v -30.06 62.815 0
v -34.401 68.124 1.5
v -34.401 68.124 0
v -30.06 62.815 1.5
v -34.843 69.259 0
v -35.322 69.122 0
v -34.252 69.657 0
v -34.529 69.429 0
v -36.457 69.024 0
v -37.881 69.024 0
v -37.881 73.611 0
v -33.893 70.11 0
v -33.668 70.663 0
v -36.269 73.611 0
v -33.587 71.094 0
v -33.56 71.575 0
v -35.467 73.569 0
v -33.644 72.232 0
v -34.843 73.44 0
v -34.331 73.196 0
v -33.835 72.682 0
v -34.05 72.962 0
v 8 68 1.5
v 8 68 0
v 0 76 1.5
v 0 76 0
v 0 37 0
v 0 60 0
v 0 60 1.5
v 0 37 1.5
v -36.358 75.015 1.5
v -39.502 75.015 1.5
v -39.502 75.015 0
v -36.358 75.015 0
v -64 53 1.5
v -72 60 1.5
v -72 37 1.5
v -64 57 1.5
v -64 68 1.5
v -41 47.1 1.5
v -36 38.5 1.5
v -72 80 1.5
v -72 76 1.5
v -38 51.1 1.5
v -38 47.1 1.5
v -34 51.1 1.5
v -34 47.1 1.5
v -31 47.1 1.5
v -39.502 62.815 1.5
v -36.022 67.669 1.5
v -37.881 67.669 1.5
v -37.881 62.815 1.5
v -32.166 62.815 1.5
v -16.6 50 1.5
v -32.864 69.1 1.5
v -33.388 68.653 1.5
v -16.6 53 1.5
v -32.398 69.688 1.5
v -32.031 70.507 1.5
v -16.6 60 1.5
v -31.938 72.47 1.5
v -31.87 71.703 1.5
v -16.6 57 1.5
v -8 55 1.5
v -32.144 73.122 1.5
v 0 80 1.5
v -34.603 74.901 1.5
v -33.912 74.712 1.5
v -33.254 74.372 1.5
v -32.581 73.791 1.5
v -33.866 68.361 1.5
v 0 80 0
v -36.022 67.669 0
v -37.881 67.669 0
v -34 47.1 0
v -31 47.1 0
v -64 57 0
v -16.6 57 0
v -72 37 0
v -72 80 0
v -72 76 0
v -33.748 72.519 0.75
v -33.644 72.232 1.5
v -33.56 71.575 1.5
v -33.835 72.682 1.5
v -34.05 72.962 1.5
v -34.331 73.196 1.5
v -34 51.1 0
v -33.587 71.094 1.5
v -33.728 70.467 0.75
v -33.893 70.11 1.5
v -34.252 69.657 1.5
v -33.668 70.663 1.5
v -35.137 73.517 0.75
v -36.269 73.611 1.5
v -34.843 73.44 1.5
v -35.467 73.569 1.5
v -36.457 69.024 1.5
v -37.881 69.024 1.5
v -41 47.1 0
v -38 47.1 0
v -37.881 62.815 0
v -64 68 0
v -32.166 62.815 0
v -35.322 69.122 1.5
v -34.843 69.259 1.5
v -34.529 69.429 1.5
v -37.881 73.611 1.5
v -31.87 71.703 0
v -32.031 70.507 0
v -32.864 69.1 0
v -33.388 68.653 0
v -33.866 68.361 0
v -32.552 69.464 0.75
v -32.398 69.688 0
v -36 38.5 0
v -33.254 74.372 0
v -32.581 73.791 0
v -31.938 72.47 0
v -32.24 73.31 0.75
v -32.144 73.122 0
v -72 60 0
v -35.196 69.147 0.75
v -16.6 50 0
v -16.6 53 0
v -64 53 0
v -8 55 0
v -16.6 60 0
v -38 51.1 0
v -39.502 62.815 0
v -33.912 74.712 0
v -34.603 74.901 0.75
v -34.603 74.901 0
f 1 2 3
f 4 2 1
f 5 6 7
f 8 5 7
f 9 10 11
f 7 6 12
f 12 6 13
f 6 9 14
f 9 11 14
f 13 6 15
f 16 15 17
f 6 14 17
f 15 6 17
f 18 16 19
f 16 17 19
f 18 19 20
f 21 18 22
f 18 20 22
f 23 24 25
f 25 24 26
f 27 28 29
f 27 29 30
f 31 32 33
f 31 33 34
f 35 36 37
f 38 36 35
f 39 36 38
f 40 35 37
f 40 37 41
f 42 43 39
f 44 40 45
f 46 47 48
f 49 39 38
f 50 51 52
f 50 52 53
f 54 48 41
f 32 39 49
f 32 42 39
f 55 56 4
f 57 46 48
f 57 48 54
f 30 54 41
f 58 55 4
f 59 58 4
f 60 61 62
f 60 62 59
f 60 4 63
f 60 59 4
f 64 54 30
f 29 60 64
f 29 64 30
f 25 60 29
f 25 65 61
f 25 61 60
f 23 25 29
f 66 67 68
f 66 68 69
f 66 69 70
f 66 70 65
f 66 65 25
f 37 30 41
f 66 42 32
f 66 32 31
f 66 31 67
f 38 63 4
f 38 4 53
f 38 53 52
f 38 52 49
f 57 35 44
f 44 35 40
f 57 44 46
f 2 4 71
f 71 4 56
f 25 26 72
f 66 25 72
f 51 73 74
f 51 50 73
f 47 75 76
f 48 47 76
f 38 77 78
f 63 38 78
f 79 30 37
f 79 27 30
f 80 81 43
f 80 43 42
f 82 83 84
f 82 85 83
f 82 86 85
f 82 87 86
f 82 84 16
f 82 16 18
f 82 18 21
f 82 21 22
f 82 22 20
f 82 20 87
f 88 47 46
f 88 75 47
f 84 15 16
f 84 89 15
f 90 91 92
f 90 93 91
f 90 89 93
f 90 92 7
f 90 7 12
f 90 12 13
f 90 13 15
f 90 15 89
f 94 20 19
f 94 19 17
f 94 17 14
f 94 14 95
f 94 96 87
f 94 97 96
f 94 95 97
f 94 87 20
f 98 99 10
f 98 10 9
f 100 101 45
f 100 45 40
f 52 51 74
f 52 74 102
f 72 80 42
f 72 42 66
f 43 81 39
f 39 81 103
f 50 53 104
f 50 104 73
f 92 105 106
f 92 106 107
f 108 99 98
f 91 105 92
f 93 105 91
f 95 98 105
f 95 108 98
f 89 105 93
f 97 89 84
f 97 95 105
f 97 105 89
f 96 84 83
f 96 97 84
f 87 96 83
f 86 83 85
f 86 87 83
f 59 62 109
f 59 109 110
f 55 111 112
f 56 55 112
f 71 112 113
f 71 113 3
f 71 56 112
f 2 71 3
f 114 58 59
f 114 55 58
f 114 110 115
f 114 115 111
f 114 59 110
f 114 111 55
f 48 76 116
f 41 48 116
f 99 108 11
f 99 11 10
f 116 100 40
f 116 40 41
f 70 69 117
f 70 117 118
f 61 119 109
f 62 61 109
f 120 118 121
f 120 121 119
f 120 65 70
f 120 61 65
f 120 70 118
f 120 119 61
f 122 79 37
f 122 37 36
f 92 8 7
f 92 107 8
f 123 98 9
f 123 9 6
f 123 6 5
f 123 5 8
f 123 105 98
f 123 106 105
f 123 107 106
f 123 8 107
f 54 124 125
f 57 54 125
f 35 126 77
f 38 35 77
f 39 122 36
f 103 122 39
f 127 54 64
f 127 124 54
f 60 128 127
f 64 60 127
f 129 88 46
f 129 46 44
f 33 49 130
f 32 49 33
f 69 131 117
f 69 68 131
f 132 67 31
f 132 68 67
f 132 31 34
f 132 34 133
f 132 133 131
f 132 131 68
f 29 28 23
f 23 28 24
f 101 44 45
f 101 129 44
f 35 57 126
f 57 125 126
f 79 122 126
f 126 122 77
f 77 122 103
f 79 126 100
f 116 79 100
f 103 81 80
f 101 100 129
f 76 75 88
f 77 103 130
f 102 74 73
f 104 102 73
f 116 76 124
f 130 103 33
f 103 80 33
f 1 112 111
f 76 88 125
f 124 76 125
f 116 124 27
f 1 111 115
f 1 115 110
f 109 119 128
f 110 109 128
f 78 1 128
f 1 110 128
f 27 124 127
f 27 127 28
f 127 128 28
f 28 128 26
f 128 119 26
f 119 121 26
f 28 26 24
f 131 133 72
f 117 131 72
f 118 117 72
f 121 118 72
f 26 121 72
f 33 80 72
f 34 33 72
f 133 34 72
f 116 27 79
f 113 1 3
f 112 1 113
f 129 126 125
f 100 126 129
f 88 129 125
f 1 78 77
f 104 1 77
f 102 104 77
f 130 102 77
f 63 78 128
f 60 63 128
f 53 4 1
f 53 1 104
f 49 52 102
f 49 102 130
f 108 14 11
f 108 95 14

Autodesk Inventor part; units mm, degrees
ref_plane "YZ Plane" through (0, 0, 0) normal (1, 0, 0) x (0, 1, 0)
ref_plane "XZ Plane" through (0, 0, 0) normal (0, 1, 0) x (-1, 0, 0)
ref_plane "XY Plane" through (0, 0, 0) normal (0, 0, 1) x (1, 0, 0)
sketch "Sketch1" plane through (0, 0, 0) normal (0, 0, 1) x (1, 0, 0)
  circle A0 centre (-72, 68) radius 8 construction
  line L0 (-72, 60) -> (0, 60) construction
  line L1 (-72, 76) -> (-64, 68)
  line L2 (-72, 60) -> (-64, 68)
  line L3 (-72, 76) -> (-72, 80)
  line L4 (0, 76) -> (0, 80)
  line L5 (-72, 80) -> (0, 80)
  line L6 (-72, 76) -> (11.4847, 76) construction
  line L7 (-64, 68) -> (11.3495, 68) construction
  line L8 (-72, 60) -> (23.0654, 60) construction
  circle A1 centre (0, 68) radius 8 construction
  line L9 (0, 60) -> (8, 68)
  line L10 (8, 68) -> (0, 76)
  line L11 (-34, 51.1) -> (-38, 51.1)
  line L12 (-38, 51.1) -> (-38, 47.1)
  line L13 (-34, 47.1) -> (-34, 51.1)
  line L14 (-34, 51.1) -> (-34, 39.9508) construction
  line L15 (-34, 47.1) -> (-31, 47.1)
  line L16 (-38, 47.1) -> (-41, 47.1)
  line L17 (-36, 51.1) -> (-36, 38.5) construction
  line L18 (-41, 47.1) -> (-36, 38.5)
  line L19 (-31, 47.1) -> (-36, 38.5)
  line L20 (0, 37) -> (-91.064, 37) construction
  line L21 (0, 37) -> (-72, 37)
  line L22 (-64, 68) -> (-64, -7.5721) construction
  line L23 (31.0795, 0) -> (31.0795, 55) construction
  line L24 (31.0795, 55) -> (-111.8136, 55) construction
  line L25 (-8, 68) -> (-8, -20.4909) construction
  line L26 (-8, 55) -> (-16.6, 55) construction
  line L27 (-16.6, 55) -> (-16.6, 50) construction
  line L28 (-16.6, 50) -> (-8, 55)
  line L29 (-16.6, 60) -> (-8, 55)
  line L30 (-16.6, 50) -> (-16.6, 53)
  line L31 (-16.6, 53) -> (-64, 53)
  line L32 (-64, 53) -> (-64, 57)
  line L33 (-64, 57) -> (-16.6, 57)
  line L34 (-16.6, 57) -> (-16.6, 60)
  line L35 (-72, 37) -> (-72, 60)
  line L36 (-72, 35.1512) -> (-72, 37)
  line L37 (0, 60) -> (0, 37)
  point P0 (0, 78)
  point P1 (-72, 78)
  point P2 (-137.4598, 47.0487)
  point P3 (-32.5, 47.1)
  dimension "d5" = 72
  dimension "d13" = 4
  dimension "d25" = 4
  dimension "d26" = 3
  dimension "d27" = 3
  dimension "d31" = 4
  dimension "d50" = 55
  dimension "d51" = 8.6
  dimension "d52" = 5
  dimension "d54" = 4
  dimension "d55" = 1.5
extrude "Extrusion7" add sketch "Sketch1" along normal blind 1.5
sketch "Sketch10" plane through (0, 0, 1.5) normal (0, 0, 1) x (1, 0, 0)
  line L0 (-40.7379, 75.0151) -> (-32.2319, 75.0151) construction
  line L1 (-32.2319, 75.0151) -> (-32.2319, 65.3644) construction
  line L2 (-32.2319, 65.3644) -> (-40.7379, 65.3644) construction
  line L3 (-40.7379, 65.3644) -> (-40.7379, 75.0151) construction
  line L4 (-30.0604, 62.8151) -> (-32.1663, 62.8151)
  line L5 (-32.1663, 62.8151) -> (-36.022, 67.6694)
  line L6 (-36.022, 67.6694) -> (-37.8807, 67.6694)
  line L7 (-37.8807, 67.6694) -> (-37.8807, 62.8151)
  line L8 (-37.8807, 62.8151) -> (-39.5021, 62.8151)
  line L9 (-39.5021, 62.8151) -> (-39.5021, 75.0151)
  line L10 (-39.5021, 75.0151) -> (-36.3582, 75.0151)
  spline S0 degree 2 poles (-36.3582, 75.0151) (-35.3102, 75.0151) (-33.8964, 74.7877) (-33.2538, 74.3725) knots 0 0 0 1 2 2 2
  spline S1 degree 2 poles (-33.2538, 74.3725) (-32.6112, 73.9573) (-31.8697, 72.6621) (-31.8697, 71.7031) knots 0 0 0 1 2 2 2
  spline S2 degree 2 poles (-31.8697, 71.7031) (-31.8697, 70.3684) (-33.234, 68.5592) (-34.4006, 68.1242) knots 0 0 0 1 2 2 2
  line L11 (-34.4006, 68.1242) -> (-30.0604, 62.8151)
  spline S3 degree 2 poles (-33.5603, 71.5746) (-33.5603, 72.1085) (-33.936, 72.9291) (-34.3314, 73.196) knots 0 0 0 1 2 2 2
  spline S4 degree 2 poles (-34.3314, 73.196) (-34.6775, 73.4234) (-35.5969, 73.6112) (-36.2692, 73.6112) knots 0 0 0 1 2 2 2
  line L12 (-36.2692, 73.6112) -> (-37.8807, 73.6112)
  line L13 (-37.8807, 73.6112) -> (-37.8807, 69.0239)
  line L14 (-37.8807, 69.0239) -> (-36.457, 69.0239)
  spline S5 degree 2 poles (-36.457, 69.0239) (-35.7551, 69.0239) (-34.6379, 69.271) (-34.2523, 69.6566) knots 0 0 0 1 2 2 2
  spline S6 degree 2 poles (-34.2523, 69.6566) (-33.8964, 69.9928) (-33.5603, 70.9419) (-33.5603, 71.5746) knots 0 0 0 1 2 2 2
  point P0 (0, 0)
sketch "Sketch11" plane through (0, 0, 1.5) normal (0, 0, 1) x (1, 0, 0)
  line L0 (-37.8813, 69.6702) -> (-36.5373, 69.6702)
  line L1 (-36.5373, 69.6702) -> (-36.5373, 66.5093)
  line L2 (-36.5373, 66.5093) -> (-37.8813, 66.5093)
  line L3 (-37.8813, 66.5093) -> (-37.8813, 69.6702)
  point P0 (0, 0)
extrude "Extrusion11" cut sketch "Sketch10" against normal up to surface (1.5 mm away)
extrude "Extrusion12" [suppressed]
properties part number "MS_R_Front_top_yellow_v3"
